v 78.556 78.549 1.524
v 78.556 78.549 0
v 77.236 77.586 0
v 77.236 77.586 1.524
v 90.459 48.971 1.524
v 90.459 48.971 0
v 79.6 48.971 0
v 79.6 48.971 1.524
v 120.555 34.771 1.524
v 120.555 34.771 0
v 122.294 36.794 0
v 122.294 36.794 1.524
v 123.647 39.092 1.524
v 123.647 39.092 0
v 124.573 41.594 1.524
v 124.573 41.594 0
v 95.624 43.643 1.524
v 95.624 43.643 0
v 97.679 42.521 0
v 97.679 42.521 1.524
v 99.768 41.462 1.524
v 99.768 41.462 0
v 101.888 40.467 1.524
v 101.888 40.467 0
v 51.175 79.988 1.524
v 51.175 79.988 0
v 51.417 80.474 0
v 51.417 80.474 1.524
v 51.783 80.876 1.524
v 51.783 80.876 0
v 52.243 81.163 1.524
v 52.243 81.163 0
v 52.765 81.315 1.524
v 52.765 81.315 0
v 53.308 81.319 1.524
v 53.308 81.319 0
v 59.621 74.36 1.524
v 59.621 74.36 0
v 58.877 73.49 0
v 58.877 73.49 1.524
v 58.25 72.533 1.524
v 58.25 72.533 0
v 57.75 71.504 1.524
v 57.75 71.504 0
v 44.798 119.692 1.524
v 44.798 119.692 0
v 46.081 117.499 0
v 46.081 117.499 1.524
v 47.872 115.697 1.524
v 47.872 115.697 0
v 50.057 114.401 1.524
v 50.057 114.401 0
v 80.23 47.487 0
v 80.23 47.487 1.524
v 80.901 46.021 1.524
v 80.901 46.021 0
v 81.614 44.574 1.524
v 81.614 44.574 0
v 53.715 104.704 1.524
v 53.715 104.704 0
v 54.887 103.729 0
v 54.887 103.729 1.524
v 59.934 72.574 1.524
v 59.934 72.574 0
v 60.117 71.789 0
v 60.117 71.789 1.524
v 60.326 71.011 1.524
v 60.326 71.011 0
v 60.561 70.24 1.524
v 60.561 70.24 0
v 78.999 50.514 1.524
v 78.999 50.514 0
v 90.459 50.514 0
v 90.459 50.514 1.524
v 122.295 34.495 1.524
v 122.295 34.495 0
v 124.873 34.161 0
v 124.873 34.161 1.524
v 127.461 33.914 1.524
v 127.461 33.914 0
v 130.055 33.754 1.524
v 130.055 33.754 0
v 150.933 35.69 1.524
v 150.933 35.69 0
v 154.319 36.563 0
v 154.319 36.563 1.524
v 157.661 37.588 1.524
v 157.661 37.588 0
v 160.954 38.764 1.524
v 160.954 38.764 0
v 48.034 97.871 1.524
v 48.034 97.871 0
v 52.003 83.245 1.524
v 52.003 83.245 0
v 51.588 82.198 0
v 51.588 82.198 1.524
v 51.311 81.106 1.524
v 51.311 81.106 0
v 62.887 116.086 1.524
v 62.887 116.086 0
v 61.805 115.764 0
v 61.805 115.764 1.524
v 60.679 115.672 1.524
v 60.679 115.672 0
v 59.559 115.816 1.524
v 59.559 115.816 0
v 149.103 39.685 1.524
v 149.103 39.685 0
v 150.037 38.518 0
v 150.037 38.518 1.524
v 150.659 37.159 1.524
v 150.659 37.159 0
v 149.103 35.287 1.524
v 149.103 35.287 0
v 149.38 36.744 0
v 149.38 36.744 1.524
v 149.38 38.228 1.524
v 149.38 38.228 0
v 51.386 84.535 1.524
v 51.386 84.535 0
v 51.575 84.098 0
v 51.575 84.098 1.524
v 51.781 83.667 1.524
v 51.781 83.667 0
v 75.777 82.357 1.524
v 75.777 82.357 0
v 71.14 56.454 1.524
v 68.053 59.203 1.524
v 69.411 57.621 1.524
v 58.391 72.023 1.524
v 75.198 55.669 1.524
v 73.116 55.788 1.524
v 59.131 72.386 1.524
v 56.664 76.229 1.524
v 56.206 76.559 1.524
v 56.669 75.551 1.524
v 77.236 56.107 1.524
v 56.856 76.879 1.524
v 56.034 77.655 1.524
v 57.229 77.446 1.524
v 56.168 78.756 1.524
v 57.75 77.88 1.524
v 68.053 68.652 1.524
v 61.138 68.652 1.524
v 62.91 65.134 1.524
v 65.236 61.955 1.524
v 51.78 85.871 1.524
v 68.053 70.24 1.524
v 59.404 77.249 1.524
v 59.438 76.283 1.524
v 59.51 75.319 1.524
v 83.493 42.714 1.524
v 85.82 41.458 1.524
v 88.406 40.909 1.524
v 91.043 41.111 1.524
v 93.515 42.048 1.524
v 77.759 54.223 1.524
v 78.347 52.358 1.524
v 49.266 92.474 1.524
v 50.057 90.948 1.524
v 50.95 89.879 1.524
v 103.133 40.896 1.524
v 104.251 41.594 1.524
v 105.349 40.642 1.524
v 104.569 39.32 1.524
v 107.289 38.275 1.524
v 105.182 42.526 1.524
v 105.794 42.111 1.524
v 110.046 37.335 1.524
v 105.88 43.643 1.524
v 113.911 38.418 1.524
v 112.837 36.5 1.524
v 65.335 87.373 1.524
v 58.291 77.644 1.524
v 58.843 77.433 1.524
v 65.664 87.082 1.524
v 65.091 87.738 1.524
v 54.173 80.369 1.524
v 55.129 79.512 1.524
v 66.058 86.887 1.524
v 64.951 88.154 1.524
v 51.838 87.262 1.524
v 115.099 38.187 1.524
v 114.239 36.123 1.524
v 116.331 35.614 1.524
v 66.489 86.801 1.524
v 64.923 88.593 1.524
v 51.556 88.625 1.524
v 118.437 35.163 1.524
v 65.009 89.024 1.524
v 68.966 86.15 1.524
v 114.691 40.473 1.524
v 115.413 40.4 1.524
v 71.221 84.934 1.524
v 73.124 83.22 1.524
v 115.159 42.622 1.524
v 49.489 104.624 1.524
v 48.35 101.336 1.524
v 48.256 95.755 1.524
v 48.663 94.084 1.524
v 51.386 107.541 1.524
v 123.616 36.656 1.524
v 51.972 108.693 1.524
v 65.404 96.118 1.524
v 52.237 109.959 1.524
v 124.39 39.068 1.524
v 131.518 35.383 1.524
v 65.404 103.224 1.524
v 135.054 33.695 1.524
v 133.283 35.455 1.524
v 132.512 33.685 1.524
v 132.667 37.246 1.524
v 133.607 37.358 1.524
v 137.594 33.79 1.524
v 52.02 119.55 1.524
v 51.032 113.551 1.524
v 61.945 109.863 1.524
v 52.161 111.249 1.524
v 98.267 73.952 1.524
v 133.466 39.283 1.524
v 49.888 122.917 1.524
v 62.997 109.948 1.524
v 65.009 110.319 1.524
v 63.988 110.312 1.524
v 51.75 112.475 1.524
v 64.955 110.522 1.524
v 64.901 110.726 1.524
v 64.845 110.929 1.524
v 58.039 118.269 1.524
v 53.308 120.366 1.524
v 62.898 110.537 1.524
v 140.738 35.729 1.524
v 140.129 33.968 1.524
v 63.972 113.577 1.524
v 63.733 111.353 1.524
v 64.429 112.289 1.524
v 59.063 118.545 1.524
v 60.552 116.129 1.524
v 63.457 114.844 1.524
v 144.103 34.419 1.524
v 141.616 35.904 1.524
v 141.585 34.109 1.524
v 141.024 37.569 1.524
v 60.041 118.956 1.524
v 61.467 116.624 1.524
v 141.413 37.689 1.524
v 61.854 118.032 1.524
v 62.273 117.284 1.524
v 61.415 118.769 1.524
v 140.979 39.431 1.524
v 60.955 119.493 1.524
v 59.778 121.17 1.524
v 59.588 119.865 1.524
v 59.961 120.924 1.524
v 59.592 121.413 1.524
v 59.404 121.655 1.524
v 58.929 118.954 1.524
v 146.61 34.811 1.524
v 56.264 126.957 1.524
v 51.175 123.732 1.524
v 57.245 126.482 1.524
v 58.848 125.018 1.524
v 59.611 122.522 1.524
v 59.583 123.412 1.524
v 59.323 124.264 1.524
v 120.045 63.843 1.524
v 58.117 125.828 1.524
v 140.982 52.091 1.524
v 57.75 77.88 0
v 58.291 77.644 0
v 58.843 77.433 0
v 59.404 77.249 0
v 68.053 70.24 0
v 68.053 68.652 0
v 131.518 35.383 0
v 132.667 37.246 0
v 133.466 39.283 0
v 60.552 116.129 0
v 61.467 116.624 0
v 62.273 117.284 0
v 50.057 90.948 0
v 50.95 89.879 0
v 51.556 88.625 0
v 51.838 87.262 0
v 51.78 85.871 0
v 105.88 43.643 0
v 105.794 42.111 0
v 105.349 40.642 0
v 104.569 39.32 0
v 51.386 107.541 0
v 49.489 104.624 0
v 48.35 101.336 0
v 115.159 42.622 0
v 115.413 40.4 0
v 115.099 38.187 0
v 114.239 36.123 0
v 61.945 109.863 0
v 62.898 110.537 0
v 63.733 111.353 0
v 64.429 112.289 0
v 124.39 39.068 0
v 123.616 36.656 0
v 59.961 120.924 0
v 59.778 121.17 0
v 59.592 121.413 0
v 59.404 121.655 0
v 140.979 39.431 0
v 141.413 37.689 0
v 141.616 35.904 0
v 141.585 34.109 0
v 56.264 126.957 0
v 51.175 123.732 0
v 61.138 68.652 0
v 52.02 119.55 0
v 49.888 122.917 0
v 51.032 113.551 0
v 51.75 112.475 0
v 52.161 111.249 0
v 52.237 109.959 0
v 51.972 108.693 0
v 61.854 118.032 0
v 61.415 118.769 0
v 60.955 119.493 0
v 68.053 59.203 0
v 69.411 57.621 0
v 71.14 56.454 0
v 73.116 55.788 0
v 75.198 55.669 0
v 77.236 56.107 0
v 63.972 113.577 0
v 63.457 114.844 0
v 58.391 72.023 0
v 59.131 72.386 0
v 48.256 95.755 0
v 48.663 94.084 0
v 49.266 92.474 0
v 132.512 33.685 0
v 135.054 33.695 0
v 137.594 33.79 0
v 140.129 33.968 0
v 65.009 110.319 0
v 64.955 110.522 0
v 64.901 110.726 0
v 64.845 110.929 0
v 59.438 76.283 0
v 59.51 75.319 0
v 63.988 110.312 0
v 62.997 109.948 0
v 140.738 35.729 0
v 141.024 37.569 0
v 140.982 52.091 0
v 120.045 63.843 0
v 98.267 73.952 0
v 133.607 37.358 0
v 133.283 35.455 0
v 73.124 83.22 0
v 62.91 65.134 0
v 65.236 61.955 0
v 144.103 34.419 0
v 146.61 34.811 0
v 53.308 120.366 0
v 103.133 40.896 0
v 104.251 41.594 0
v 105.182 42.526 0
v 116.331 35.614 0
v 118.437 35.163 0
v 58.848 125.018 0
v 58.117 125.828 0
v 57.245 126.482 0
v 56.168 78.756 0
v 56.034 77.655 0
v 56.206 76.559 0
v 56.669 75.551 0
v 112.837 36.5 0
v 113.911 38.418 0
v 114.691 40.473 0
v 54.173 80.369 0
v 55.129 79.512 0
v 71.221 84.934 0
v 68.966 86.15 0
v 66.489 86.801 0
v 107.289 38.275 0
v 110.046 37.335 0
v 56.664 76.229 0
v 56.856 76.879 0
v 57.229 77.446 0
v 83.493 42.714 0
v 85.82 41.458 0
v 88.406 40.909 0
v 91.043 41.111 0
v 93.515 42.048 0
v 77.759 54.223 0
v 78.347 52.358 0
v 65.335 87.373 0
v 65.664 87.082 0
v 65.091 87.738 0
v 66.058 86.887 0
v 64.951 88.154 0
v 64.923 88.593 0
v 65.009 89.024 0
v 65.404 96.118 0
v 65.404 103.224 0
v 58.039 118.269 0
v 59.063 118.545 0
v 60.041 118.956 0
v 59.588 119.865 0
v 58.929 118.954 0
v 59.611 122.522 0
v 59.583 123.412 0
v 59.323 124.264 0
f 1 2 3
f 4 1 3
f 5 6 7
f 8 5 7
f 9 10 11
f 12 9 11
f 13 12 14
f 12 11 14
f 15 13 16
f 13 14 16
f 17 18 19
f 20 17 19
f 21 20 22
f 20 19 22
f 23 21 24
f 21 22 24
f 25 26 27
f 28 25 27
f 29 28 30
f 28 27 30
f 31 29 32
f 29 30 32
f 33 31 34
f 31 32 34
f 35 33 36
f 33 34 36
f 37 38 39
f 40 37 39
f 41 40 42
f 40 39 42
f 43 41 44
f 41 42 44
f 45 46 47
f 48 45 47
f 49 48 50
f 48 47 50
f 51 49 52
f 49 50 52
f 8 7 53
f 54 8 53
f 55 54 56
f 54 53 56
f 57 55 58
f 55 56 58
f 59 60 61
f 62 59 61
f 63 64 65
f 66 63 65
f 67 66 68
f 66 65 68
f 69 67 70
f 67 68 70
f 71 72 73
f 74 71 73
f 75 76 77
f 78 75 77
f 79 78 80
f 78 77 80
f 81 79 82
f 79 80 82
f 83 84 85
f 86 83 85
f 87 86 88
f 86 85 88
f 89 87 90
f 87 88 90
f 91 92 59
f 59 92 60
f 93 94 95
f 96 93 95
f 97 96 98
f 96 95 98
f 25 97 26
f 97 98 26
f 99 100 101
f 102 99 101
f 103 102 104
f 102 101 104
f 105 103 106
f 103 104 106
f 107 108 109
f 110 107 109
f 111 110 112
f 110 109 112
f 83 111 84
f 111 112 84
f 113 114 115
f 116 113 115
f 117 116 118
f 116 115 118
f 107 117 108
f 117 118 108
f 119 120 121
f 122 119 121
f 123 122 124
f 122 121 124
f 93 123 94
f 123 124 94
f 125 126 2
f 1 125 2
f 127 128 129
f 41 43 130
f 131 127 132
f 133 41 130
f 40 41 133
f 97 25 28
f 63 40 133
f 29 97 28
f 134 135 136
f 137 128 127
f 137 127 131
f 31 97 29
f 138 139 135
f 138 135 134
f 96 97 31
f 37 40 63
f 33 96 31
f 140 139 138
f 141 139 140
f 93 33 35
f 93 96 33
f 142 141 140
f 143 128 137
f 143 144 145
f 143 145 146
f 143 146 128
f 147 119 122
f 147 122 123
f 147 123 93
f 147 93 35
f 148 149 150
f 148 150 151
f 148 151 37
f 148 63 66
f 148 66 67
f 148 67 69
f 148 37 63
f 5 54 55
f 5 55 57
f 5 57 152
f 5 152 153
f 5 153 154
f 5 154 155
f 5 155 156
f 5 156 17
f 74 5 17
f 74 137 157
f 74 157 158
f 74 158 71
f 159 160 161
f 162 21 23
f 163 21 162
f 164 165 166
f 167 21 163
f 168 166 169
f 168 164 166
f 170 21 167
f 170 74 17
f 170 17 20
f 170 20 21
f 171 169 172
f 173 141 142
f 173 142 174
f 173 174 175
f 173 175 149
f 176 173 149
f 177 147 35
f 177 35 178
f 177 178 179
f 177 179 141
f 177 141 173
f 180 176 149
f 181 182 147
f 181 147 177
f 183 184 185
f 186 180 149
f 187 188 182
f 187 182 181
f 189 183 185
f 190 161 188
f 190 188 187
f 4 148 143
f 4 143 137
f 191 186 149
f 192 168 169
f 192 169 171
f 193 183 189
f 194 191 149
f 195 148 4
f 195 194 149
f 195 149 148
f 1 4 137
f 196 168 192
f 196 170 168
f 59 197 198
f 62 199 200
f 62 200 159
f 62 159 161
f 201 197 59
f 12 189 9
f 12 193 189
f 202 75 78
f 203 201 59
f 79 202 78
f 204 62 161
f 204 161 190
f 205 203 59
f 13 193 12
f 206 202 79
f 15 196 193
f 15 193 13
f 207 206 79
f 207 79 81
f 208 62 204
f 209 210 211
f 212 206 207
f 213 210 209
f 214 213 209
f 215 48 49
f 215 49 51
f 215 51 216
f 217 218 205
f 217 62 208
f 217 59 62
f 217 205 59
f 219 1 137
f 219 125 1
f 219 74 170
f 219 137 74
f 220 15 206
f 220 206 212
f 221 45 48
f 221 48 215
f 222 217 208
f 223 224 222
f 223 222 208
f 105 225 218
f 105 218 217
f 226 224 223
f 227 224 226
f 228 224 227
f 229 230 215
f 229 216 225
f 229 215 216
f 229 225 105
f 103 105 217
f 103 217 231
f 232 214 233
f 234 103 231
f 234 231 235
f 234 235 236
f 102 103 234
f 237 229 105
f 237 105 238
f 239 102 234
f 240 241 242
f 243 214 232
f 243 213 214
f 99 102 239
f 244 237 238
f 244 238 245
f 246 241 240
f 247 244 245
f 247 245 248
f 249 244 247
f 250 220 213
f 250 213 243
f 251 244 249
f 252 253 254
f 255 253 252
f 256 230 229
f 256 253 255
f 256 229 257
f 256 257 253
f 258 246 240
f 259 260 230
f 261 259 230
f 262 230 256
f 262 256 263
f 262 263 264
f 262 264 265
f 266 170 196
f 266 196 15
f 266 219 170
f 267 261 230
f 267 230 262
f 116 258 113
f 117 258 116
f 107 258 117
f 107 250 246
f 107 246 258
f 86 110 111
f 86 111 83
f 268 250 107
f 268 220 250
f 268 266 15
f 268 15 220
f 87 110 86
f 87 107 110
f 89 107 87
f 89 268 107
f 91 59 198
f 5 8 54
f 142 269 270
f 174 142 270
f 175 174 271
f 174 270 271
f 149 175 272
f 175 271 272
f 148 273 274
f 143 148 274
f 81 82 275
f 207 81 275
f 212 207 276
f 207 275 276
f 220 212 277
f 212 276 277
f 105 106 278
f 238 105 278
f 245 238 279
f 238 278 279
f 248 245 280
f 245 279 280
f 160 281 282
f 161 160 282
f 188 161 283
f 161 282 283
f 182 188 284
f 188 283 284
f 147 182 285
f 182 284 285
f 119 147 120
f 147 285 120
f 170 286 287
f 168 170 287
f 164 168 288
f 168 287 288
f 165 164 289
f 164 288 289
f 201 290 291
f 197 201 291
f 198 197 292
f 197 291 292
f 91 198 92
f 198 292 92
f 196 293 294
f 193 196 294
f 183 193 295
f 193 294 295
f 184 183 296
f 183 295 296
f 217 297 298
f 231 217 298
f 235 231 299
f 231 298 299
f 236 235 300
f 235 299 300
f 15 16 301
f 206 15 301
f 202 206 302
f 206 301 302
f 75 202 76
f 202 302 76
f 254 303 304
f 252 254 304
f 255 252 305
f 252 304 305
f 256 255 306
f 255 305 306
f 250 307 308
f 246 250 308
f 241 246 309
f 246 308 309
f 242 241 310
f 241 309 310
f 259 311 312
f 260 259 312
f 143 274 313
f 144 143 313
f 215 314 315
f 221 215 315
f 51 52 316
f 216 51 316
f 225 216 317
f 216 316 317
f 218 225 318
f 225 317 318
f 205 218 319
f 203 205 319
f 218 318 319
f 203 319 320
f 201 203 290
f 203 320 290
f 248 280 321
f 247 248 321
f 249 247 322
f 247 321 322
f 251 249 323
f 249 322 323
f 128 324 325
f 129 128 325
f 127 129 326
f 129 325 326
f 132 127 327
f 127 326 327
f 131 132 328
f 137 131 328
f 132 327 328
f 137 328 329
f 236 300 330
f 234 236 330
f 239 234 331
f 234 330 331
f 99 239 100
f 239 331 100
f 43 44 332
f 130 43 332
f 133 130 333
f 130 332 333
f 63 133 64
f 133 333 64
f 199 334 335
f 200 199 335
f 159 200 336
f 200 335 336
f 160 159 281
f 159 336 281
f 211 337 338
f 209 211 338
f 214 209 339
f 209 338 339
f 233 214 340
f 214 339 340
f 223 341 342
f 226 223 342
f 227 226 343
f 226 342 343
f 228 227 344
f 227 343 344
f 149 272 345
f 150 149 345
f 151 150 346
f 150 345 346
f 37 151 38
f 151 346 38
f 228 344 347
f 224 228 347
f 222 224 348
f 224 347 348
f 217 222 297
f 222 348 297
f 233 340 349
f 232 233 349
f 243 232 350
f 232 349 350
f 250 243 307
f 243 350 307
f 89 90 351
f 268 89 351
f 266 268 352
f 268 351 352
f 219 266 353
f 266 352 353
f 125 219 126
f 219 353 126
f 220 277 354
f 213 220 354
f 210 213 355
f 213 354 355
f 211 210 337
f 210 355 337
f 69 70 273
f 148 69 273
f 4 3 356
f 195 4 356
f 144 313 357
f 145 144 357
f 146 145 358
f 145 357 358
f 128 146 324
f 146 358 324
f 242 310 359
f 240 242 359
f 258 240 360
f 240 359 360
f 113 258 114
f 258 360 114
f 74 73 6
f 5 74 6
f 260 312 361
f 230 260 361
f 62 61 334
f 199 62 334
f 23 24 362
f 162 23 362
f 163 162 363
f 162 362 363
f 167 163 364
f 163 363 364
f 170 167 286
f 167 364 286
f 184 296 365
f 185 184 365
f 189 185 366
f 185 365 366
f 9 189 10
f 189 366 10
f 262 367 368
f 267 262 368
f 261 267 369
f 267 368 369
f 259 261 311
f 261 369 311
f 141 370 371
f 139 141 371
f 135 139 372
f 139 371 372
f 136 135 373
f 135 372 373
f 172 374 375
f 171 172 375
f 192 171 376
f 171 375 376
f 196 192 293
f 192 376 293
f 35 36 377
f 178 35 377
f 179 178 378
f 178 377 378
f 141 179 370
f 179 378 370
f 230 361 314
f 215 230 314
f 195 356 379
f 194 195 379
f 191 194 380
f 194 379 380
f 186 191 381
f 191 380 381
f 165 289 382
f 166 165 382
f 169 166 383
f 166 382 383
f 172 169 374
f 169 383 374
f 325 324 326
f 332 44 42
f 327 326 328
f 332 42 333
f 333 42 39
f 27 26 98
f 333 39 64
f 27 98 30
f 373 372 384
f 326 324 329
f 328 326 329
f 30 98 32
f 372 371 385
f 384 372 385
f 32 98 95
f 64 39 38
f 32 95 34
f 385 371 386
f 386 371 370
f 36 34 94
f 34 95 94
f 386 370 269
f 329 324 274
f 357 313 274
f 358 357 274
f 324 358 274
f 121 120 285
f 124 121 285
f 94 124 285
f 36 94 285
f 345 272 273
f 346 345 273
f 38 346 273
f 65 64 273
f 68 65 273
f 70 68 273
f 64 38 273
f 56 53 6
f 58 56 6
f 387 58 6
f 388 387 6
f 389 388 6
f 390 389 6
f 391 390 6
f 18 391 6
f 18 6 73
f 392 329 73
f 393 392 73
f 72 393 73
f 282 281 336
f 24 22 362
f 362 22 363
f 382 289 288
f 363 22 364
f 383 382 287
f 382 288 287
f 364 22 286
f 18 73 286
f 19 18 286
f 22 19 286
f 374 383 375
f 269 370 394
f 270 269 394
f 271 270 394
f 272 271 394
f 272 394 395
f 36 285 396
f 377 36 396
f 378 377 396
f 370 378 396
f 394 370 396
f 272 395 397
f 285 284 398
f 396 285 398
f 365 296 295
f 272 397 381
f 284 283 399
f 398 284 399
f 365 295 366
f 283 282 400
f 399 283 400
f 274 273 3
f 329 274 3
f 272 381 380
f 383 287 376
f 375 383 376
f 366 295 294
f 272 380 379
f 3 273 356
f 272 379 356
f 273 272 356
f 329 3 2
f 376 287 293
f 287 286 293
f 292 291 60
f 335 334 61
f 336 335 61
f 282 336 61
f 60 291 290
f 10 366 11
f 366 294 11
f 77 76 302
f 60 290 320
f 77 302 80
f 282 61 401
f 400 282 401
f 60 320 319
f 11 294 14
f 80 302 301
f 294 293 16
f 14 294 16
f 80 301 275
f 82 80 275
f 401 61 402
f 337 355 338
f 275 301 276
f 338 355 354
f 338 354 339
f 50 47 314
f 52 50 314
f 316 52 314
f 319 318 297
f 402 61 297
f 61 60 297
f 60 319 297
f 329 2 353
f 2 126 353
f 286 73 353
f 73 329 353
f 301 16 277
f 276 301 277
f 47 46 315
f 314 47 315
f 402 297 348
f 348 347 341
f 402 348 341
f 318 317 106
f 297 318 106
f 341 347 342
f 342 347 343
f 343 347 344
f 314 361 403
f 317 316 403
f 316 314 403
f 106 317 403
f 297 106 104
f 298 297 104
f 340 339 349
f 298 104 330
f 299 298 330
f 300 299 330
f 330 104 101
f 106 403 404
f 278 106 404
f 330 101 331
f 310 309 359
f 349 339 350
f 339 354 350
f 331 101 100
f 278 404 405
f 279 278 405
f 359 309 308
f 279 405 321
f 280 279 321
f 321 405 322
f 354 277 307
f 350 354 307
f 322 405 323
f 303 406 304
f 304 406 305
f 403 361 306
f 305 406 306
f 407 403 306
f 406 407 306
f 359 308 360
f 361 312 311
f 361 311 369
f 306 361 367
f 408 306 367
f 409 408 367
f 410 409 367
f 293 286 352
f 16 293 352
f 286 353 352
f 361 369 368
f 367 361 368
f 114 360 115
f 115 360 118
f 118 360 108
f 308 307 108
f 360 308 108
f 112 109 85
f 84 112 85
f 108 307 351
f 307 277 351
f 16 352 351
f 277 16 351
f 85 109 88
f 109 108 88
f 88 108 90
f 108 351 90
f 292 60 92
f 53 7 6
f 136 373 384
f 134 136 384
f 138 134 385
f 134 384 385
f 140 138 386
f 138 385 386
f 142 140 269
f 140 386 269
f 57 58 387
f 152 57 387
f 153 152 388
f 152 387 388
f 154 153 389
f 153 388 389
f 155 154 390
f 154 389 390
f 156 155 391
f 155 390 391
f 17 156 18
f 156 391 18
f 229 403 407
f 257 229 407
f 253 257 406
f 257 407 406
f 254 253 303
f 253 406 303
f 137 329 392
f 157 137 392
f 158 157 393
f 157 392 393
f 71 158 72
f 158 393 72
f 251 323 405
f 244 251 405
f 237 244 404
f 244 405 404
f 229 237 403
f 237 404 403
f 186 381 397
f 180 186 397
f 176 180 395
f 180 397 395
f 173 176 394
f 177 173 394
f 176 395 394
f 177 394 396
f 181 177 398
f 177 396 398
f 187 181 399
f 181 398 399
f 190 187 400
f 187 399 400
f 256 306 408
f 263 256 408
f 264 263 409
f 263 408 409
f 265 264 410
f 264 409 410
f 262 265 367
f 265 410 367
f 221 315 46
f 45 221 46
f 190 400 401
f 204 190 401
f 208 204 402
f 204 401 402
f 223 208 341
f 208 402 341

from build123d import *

# Parameters (mm, degrees)
BOSS_EXTRUDE1_DEPTH = 1.524


with BuildPart() as part:
    # Sketch1 → Boss-Extrude1 (new body)
    with BuildSketch(Plane.XY):
        with BuildLine():
            Line((56.264141338, 126.956858816), (51.174858052, 123.732229714))
            Line((51.174858052, 123.732229714), (53.307781304, 120.365935384))
            Line((53.307781304, 120.365935384), (52.020439004, 119.550260325))
            Line((52.020439004, 119.550260325), (49.887515751, 122.916554654))
            Line((49.887515751, 122.916554654), (44.798232465, 119.691925553))
            ThreePointArc((44.798232465, 119.691925553), (46.919348528, 116.541161993), (50.056966547, 114.400648613))
            ThreePointArc((50.056966547, 114.400648613), (52.160922541, 111.249416579), (51.38551555, 107.540557165))
            ThreePointArc((51.38551555, 107.540557165), (48.819467631, 103.01456573), (48.033803289, 97.871421561))
            Line((48.033803289, 97.871421561), (53.714736294, 104.703768794))
            Line((53.714736294, 104.703768794), (54.886575206, 103.729412819))
            Line((54.886575206, 103.729412819), (48.256070281, 95.755033975))
            ThreePointArc((48.256070281, 95.755033975), (48.940021774, 93.270180673), (50.056966547, 90.947527029))
            ThreePointArc((50.056966547, 90.947527029), (51.738858239, 87.952338233), (51.38551555, 84.535458878))
            ThreePointArc((51.38551555, 84.535458878), (51.676023362, 83.881512061), (52.003112941, 83.245073819))
            ThreePointArc((52.003112941, 83.245073819), (51.432071992, 81.656527536), (51.174858052, 79.988172643))
            ThreePointArc((51.174858052, 79.988172643), (52.003112941, 81.035329758), (53.307781304, 81.318851624))
            ThreePointArc((53.307781304, 81.318851624), (54.639987623, 79.928222594), (56.168191464, 78.75637969))
            ThreePointArc((56.168191464, 78.75637969), (56.082073865, 77.101010294), (56.669286419, 75.550898847))
            ThreePointArc((56.669286419, 75.550898847), (56.856082806, 76.879297739), (57.74991105, 77.879601482))
            ThreePointArc((57.74991105, 77.879601482), (58.566064016, 77.535130701), (59.404362787, 77.2487377))
            ThreePointArc((59.404362787, 77.2487377), (59.468887944, 75.800864539), (59.621212135, 74.359581247))
            ThreePointArc((59.621212135, 74.359581247), (58.548532564, 73.021617268), (57.74991105, 71.50405582))
            ThreePointArc((57.74991105, 71.50405582), (58.750795137, 72.225661043), (59.934465672, 72.574096285))
            ThreePointArc((59.934465672, 72.574096285), (60.218266334, 71.399198054), (60.56120896, 70.240181651))
            Line((60.56120896, 70.240181651), (68.053425724, 70.240181651))
            Line((68.053425724, 70.240181651), (68.053425724, 68.651586531))
            Line((68.053425724, 68.651586531), (61.138299457, 68.651586531))
            ThreePointArc((61.138299457, 68.651586531), (64.007218606, 63.496556651), (68.053425724, 59.203161944))
            ThreePointArc((68.053425724, 59.203161944), (72.105402023, 56.054971734), (77.236381434, 56.106583856))
            ThreePointArc((77.236381434, 56.106583856), (78.044746131, 53.287579438), (78.998529881, 50.51439788))
            Line((78.998529881, 50.51439788), (90.459222019, 50.51439788))
            Line((90.459222019, 50.51439788), (90.459222019, 48.97144986))
            Line((90.459222019, 48.97144986), (79.600424402, 48.97144986))
            ThreePointArc((79.600424402, 48.97144986), (80.560218525, 46.751381797), (81.614302179, 44.574499941))
            ThreePointArc((81.614302179, 44.574499941), (88.40638605, 40.908931841), (95.623925921, 43.643143066))
            ThreePointArc((95.623925921, 43.643143066), (98.719457239, 41.9837065), (101.887587861, 40.467463703))
            ThreePointArc((101.887587861, 40.467463703), (104.250570747, 41.59409239), (105.879794993, 43.643143066))
            ThreePointArc((105.879794993, 43.643143066), (105.615285106, 41.362757758), (104.568635279, 39.319562522))
            ThreePointArc((104.568635279, 39.319562522), (108.662838982, 37.791938771), (112.83726515, 36.499536179))
            ThreePointArc((112.83726515, 36.499536179), (114.338838664, 39.431267188), (115.158578251, 42.621533122))
            ThreePointArc((115.158578251, 42.621533122), (115.32642817, 39.283498881), (114.23888805, 36.123134554))
            ThreePointArc((114.23888805, 36.123134554), (117.382688145, 35.380759015), (120.554912672, 34.771175532))
            ThreePointArc((120.554912672, 34.771175532), (123.021749605, 37.9129634), (124.572686361, 41.59409239))
            ThreePointArc((124.572686361, 41.59409239), (124.074787113, 37.838934231), (122.294984417, 34.495071372))
            ThreePointArc((122.294984417, 34.495071372), (126.165693737, 34.02629014), (130.055199537, 33.754460929))
            ThreePointArc((130.055199537, 33.754460929), (132.134455488, 36.288278623), (133.465692892, 39.283498881))
            ThreePointArc((133.465692892, 39.283498881), (133.502994203, 36.396459224), (132.511774167, 33.684656833))
            ThreePointArc((132.511774167, 33.684656833), (136.324034113, 33.731918308), (140.129256944, 33.968220541))
            ThreePointArc((140.129256944, 33.968220541), (140.922011669, 36.642526439), (140.979432276, 39.431267188))
            ThreePointArc((140.979432276, 39.431267188), (141.543710337, 36.799823517), (141.584568778, 34.108869018))
            ThreePointArc((141.584568778, 34.108869018), (145.358502787, 34.60468639), (149.103252173, 35.286789609))
            ThreePointArc((149.103252173, 35.286789609), (149.41526381, 37.485880685), (149.103252173, 39.68497176))
            ThreePointArc((149.103252173, 39.68497176), (150.389458807, 37.857811323), (150.933061601, 35.690476839))
            ThreePointArc((150.933061601, 35.690476839), (155.995803512, 37.056053135), (160.953619193, 38.763746888))
            ThreePointArc((160.953619193, 38.763746888), (120.045431958, 63.84340718), (75.776786754, 82.357083072))
            Line((75.776786754, 82.357083072), (78.55577188, 78.549383563))
            Line((78.55577188, 78.549383563), (77.236381434, 77.586448747))
            Line((77.236381434, 77.586448747), (73.124487989, 83.220467621))
            ThreePointArc((73.124487989, 83.220467621), (70.129640963, 85.609264926), (66.488706533, 86.800507029))
            ThreePointArc((66.488706533, 86.800507029), (65.201078968, 87.547474126), (65.008773799, 89.023605324))
            ThreePointArc((65.008773799, 89.023605324), (65.45394794, 99.671148502), (65.008773799, 110.31869168))
            ThreePointArc((65.008773799, 110.31869168), (64.928240982, 110.624021202), (64.844587925, 110.928510639))
            ThreePointArc((64.844587925, 110.928510639), (63.504830628, 110.096374776), (61.945041493, 109.863013337))
            ThreePointArc((61.945041493, 109.863013337), (63.331098083, 110.928510639), (64.429350166, 112.288760519))
            ThreePointArc((64.429350166, 112.288760519), (63.72134744, 114.213049759), (62.887114334, 116.086071934))
            ThreePointArc((62.887114334, 116.086071934), (61.244379947, 115.688493307), (59.559011987, 115.815693414))
            ThreePointArc((59.559011987, 115.815693414), (61.021114976, 116.355052106), (62.272659221, 117.283647794))
            ThreePointArc((62.272659221, 117.283647794), (61.637025251, 118.402299275), (60.955310984, 119.493480899))
            ThreePointArc((60.955310984, 119.493480899), (59.559011987, 118.734336878), (58.039485129, 118.268516457))
            ThreePointArc((58.039485129, 118.268516457), (59.291178035, 119.385811258), (59.960570457, 120.924315918))
            ThreePointArc((59.960570457, 120.924315918), (59.685184939, 121.291735218), (59.404362787, 121.655016161))
            ThreePointArc((59.404362787, 121.655016161), (59.583464699, 123.412306739), (58.847642556, 125.018144041))
            ThreePointArc((58.847642556, 125.018144041), (57.697156367, 126.175748202), (56.264141338, 126.956858816))
        make_face()
    extrude(amount=BOSS_EXTRUDE1_DEPTH)


solid = part.part
